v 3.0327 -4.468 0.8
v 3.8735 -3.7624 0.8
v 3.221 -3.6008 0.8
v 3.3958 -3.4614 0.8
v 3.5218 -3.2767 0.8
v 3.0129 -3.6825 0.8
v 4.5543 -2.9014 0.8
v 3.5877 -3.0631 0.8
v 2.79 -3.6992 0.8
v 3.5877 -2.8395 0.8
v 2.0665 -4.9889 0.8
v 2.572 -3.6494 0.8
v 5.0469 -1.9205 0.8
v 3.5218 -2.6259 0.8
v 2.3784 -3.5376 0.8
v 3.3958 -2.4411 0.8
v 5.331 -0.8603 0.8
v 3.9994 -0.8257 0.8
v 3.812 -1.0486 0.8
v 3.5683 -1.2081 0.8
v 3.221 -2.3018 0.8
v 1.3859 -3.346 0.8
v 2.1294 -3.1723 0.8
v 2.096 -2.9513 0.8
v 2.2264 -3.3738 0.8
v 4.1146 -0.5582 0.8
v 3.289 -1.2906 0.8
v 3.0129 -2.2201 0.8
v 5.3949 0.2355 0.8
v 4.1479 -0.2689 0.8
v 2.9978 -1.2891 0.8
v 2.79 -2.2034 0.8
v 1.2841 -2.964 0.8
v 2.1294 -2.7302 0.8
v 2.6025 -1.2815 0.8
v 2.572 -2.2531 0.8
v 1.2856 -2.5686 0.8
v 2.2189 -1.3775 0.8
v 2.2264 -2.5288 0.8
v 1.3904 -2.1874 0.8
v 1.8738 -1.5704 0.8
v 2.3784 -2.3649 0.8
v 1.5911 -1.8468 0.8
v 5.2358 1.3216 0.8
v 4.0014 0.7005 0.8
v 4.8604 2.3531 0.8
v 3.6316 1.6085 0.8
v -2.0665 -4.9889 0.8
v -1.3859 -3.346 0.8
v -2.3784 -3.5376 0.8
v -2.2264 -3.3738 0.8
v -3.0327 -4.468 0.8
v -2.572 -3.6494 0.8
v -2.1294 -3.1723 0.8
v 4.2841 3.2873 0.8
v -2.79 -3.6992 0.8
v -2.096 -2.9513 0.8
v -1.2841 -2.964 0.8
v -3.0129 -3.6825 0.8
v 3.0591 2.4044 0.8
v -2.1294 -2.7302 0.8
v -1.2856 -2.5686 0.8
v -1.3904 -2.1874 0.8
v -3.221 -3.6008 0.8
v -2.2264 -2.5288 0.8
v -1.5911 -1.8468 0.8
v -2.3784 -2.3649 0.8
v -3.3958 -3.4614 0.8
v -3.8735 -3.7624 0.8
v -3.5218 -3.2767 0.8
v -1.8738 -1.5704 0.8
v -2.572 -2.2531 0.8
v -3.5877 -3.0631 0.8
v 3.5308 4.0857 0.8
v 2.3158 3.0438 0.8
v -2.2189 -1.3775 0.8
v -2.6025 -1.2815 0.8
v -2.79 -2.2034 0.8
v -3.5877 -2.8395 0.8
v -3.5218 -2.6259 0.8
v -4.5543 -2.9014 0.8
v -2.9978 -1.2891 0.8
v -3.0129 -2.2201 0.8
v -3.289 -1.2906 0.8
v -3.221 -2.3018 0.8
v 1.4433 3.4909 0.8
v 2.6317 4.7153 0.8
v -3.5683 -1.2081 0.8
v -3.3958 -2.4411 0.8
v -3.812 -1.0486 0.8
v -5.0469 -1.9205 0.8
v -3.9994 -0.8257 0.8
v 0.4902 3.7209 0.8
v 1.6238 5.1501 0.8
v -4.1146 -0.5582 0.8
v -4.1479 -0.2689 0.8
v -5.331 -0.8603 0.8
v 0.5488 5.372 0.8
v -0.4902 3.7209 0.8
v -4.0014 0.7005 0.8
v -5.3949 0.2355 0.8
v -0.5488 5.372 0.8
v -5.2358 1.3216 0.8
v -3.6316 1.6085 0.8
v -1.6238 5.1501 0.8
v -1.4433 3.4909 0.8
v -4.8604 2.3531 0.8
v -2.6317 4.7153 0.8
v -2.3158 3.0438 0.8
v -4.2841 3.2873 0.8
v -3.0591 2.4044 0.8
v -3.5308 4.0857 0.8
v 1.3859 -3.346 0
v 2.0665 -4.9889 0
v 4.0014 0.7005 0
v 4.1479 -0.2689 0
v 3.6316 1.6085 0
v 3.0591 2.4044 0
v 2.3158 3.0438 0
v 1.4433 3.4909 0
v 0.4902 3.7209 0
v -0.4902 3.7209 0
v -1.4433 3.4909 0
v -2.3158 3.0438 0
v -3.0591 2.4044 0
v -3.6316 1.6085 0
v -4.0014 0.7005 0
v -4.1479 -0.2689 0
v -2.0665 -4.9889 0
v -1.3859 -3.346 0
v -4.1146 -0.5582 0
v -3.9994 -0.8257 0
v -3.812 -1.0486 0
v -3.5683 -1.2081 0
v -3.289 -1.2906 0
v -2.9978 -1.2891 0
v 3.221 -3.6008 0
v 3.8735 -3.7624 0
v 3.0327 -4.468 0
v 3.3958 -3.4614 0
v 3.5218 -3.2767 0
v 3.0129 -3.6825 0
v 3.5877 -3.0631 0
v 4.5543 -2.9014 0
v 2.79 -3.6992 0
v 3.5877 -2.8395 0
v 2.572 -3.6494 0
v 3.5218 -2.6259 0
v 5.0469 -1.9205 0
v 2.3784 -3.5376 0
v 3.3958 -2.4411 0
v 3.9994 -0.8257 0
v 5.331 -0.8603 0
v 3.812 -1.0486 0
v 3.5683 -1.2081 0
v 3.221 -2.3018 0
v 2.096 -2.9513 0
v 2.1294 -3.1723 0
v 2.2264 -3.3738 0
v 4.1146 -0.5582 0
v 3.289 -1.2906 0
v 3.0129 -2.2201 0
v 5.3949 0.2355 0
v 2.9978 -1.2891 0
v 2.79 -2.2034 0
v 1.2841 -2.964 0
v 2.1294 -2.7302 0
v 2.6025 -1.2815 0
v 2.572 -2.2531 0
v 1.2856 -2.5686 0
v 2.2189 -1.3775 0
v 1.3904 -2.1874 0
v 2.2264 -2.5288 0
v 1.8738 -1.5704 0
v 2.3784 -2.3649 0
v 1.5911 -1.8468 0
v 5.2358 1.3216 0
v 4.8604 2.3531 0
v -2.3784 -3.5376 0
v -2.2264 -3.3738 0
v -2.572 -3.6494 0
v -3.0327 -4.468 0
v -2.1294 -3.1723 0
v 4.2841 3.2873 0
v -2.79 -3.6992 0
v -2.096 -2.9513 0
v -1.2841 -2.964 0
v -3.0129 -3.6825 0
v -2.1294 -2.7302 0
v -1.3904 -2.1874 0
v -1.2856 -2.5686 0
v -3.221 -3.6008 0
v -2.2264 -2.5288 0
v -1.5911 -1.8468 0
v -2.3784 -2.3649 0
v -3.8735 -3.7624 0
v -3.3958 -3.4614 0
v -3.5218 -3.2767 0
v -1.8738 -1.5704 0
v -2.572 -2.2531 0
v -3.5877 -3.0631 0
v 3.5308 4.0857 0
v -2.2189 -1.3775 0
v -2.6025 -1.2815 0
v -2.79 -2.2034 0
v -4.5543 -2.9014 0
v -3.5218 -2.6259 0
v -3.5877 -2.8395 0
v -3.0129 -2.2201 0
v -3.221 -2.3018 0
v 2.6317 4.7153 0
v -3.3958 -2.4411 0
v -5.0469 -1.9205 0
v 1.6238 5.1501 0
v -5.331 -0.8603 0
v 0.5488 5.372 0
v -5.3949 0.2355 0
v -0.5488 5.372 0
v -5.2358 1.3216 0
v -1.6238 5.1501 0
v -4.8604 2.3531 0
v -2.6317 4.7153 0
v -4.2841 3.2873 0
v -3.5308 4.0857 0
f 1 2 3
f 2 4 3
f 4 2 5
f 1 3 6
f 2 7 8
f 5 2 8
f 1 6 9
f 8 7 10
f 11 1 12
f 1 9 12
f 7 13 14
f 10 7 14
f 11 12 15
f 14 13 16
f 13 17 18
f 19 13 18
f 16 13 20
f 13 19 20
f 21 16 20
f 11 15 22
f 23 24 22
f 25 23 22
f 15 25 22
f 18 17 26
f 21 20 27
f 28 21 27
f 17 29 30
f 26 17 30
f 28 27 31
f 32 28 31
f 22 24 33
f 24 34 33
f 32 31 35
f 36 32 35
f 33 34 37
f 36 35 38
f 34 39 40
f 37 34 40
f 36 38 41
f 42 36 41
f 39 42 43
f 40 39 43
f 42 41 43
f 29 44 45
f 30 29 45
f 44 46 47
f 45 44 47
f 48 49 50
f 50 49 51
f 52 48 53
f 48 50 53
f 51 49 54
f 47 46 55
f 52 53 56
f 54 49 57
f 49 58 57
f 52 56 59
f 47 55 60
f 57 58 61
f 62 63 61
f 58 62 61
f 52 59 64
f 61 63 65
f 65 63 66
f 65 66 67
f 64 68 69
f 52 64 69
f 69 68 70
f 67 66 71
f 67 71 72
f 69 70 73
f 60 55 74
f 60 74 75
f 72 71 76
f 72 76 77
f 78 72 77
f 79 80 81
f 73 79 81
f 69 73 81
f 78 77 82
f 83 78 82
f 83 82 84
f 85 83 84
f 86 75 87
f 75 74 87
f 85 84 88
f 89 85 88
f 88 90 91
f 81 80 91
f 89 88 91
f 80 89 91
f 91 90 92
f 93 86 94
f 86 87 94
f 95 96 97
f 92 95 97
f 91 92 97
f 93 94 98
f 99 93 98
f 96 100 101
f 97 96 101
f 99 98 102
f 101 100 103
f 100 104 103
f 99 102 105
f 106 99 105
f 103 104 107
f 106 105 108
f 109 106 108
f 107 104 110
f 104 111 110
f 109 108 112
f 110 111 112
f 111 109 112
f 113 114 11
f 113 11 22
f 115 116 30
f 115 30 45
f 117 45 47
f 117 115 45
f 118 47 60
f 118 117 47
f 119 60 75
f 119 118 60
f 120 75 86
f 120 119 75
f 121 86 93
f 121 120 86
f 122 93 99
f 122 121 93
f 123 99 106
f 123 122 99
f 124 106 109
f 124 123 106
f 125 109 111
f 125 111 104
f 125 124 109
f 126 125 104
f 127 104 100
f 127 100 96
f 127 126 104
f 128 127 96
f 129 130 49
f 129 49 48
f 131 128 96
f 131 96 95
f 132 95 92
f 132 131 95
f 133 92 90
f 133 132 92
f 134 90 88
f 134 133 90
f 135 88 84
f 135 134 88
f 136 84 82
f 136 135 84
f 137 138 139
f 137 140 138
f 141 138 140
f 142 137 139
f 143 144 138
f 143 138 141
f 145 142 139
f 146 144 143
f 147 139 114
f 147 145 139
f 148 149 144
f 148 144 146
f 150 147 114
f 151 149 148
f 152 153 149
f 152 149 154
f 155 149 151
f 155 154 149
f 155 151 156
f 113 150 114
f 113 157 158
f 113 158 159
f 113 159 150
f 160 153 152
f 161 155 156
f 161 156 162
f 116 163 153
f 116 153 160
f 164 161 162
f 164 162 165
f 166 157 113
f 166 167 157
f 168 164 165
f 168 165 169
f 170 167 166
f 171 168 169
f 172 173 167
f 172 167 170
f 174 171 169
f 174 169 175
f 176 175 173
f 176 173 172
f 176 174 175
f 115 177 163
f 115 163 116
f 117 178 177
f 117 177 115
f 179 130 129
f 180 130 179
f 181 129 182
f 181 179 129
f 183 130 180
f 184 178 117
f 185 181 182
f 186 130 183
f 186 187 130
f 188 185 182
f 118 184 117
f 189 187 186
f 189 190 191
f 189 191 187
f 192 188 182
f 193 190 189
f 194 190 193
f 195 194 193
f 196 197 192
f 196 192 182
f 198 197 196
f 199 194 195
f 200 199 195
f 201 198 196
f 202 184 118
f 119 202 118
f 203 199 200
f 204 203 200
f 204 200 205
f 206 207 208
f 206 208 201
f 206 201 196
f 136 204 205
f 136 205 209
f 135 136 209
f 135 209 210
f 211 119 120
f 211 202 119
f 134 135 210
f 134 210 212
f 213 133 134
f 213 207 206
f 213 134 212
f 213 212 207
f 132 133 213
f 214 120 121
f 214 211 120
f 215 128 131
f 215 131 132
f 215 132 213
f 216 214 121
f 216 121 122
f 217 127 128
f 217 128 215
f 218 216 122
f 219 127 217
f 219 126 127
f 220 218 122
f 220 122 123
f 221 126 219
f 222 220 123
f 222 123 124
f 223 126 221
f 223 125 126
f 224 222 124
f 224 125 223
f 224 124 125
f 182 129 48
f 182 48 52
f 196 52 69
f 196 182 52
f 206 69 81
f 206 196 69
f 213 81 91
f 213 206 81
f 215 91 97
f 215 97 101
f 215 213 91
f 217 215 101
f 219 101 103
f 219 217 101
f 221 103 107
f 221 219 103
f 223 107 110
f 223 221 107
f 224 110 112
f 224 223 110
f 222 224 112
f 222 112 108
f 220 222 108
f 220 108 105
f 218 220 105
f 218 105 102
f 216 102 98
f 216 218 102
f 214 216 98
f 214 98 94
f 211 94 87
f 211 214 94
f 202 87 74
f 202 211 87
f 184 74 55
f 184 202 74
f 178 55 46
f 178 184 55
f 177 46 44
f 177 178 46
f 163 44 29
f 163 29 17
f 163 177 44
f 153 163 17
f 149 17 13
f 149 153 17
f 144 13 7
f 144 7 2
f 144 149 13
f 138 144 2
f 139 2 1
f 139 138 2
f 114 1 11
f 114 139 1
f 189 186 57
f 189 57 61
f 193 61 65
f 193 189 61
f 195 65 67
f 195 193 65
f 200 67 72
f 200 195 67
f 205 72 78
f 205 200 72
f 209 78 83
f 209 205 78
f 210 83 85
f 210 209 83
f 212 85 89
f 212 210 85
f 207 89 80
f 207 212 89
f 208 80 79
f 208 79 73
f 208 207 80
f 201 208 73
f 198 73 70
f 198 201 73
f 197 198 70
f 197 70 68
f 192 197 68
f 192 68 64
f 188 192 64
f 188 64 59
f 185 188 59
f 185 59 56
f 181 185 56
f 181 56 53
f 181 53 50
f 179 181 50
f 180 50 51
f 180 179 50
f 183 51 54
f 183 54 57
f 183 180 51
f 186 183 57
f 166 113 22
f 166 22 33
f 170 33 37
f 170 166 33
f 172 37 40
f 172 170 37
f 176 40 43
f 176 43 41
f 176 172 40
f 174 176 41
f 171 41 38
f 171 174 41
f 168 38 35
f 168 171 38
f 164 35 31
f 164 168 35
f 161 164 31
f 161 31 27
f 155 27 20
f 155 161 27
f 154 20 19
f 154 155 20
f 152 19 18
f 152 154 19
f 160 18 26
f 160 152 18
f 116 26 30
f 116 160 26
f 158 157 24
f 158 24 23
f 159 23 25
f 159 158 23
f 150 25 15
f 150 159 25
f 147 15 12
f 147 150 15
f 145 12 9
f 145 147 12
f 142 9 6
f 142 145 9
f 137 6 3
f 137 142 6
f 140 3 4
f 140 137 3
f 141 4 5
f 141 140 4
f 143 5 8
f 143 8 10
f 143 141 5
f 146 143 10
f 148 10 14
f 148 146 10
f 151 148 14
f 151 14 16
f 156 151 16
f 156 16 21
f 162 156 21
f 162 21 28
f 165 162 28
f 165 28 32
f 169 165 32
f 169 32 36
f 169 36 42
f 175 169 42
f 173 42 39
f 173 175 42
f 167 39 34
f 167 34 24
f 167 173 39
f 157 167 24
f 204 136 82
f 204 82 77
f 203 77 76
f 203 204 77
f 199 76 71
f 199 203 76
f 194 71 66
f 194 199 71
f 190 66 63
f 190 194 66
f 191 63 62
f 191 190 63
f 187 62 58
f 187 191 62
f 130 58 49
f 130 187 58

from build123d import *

# Parameters (mm, degrees)
SKETCH_1_R        = 0.75
EXTRUDE_879_DEPTH = 0.8


with BuildPart() as part:
    # 草图1 → Extrude 879 (new body)
    with BuildSketch(Plane.XY):
        with BuildLine():
            Line((-1.385948162, -3.345974849), (-2.066490535, -4.988949476))
            ThreePointArc((-2.066490535, -4.988949476), (0, 5.4), (2.066490535, -4.988949476))
            Line((2.066490535, -4.988949476), (1.385948162, -3.345974849))
            ThreePointArc((1.385948162, -3.345974849), (1.591085636, -1.846752193), (2.997763625, -1.289072183))
            ThreePointArc((2.997763625, -1.289072183), (3.811994555, -1.04860419), (4.147928602, -0.268895796))
            ThreePointArc((4.147928602, -0.268895796), (0, 3.75), (-4.147928602, -0.268895796))
            ThreePointArc((-4.147928602, -0.268895796), (-3.811994555, -1.04860419), (-2.997763625, -1.289072183))
            ThreePointArc((-2.997763625, -1.289072183), (-1.591085636, -1.846752193), (-1.385948162, -3.345974849))
        make_face()
        with Locations((-2.84604621, -2.951274465)):
            Circle(SKETCH_1_R, mode=Mode.SUBTRACT)
        with Locations(Location((2.84604621, -2.951274465, 0), (0, 0, 180))):
            Circle(SKETCH_1_R, mode=Mode.SUBTRACT)
    extrude(amount=EXTRUDE_879_DEPTH)


solid = part.part
